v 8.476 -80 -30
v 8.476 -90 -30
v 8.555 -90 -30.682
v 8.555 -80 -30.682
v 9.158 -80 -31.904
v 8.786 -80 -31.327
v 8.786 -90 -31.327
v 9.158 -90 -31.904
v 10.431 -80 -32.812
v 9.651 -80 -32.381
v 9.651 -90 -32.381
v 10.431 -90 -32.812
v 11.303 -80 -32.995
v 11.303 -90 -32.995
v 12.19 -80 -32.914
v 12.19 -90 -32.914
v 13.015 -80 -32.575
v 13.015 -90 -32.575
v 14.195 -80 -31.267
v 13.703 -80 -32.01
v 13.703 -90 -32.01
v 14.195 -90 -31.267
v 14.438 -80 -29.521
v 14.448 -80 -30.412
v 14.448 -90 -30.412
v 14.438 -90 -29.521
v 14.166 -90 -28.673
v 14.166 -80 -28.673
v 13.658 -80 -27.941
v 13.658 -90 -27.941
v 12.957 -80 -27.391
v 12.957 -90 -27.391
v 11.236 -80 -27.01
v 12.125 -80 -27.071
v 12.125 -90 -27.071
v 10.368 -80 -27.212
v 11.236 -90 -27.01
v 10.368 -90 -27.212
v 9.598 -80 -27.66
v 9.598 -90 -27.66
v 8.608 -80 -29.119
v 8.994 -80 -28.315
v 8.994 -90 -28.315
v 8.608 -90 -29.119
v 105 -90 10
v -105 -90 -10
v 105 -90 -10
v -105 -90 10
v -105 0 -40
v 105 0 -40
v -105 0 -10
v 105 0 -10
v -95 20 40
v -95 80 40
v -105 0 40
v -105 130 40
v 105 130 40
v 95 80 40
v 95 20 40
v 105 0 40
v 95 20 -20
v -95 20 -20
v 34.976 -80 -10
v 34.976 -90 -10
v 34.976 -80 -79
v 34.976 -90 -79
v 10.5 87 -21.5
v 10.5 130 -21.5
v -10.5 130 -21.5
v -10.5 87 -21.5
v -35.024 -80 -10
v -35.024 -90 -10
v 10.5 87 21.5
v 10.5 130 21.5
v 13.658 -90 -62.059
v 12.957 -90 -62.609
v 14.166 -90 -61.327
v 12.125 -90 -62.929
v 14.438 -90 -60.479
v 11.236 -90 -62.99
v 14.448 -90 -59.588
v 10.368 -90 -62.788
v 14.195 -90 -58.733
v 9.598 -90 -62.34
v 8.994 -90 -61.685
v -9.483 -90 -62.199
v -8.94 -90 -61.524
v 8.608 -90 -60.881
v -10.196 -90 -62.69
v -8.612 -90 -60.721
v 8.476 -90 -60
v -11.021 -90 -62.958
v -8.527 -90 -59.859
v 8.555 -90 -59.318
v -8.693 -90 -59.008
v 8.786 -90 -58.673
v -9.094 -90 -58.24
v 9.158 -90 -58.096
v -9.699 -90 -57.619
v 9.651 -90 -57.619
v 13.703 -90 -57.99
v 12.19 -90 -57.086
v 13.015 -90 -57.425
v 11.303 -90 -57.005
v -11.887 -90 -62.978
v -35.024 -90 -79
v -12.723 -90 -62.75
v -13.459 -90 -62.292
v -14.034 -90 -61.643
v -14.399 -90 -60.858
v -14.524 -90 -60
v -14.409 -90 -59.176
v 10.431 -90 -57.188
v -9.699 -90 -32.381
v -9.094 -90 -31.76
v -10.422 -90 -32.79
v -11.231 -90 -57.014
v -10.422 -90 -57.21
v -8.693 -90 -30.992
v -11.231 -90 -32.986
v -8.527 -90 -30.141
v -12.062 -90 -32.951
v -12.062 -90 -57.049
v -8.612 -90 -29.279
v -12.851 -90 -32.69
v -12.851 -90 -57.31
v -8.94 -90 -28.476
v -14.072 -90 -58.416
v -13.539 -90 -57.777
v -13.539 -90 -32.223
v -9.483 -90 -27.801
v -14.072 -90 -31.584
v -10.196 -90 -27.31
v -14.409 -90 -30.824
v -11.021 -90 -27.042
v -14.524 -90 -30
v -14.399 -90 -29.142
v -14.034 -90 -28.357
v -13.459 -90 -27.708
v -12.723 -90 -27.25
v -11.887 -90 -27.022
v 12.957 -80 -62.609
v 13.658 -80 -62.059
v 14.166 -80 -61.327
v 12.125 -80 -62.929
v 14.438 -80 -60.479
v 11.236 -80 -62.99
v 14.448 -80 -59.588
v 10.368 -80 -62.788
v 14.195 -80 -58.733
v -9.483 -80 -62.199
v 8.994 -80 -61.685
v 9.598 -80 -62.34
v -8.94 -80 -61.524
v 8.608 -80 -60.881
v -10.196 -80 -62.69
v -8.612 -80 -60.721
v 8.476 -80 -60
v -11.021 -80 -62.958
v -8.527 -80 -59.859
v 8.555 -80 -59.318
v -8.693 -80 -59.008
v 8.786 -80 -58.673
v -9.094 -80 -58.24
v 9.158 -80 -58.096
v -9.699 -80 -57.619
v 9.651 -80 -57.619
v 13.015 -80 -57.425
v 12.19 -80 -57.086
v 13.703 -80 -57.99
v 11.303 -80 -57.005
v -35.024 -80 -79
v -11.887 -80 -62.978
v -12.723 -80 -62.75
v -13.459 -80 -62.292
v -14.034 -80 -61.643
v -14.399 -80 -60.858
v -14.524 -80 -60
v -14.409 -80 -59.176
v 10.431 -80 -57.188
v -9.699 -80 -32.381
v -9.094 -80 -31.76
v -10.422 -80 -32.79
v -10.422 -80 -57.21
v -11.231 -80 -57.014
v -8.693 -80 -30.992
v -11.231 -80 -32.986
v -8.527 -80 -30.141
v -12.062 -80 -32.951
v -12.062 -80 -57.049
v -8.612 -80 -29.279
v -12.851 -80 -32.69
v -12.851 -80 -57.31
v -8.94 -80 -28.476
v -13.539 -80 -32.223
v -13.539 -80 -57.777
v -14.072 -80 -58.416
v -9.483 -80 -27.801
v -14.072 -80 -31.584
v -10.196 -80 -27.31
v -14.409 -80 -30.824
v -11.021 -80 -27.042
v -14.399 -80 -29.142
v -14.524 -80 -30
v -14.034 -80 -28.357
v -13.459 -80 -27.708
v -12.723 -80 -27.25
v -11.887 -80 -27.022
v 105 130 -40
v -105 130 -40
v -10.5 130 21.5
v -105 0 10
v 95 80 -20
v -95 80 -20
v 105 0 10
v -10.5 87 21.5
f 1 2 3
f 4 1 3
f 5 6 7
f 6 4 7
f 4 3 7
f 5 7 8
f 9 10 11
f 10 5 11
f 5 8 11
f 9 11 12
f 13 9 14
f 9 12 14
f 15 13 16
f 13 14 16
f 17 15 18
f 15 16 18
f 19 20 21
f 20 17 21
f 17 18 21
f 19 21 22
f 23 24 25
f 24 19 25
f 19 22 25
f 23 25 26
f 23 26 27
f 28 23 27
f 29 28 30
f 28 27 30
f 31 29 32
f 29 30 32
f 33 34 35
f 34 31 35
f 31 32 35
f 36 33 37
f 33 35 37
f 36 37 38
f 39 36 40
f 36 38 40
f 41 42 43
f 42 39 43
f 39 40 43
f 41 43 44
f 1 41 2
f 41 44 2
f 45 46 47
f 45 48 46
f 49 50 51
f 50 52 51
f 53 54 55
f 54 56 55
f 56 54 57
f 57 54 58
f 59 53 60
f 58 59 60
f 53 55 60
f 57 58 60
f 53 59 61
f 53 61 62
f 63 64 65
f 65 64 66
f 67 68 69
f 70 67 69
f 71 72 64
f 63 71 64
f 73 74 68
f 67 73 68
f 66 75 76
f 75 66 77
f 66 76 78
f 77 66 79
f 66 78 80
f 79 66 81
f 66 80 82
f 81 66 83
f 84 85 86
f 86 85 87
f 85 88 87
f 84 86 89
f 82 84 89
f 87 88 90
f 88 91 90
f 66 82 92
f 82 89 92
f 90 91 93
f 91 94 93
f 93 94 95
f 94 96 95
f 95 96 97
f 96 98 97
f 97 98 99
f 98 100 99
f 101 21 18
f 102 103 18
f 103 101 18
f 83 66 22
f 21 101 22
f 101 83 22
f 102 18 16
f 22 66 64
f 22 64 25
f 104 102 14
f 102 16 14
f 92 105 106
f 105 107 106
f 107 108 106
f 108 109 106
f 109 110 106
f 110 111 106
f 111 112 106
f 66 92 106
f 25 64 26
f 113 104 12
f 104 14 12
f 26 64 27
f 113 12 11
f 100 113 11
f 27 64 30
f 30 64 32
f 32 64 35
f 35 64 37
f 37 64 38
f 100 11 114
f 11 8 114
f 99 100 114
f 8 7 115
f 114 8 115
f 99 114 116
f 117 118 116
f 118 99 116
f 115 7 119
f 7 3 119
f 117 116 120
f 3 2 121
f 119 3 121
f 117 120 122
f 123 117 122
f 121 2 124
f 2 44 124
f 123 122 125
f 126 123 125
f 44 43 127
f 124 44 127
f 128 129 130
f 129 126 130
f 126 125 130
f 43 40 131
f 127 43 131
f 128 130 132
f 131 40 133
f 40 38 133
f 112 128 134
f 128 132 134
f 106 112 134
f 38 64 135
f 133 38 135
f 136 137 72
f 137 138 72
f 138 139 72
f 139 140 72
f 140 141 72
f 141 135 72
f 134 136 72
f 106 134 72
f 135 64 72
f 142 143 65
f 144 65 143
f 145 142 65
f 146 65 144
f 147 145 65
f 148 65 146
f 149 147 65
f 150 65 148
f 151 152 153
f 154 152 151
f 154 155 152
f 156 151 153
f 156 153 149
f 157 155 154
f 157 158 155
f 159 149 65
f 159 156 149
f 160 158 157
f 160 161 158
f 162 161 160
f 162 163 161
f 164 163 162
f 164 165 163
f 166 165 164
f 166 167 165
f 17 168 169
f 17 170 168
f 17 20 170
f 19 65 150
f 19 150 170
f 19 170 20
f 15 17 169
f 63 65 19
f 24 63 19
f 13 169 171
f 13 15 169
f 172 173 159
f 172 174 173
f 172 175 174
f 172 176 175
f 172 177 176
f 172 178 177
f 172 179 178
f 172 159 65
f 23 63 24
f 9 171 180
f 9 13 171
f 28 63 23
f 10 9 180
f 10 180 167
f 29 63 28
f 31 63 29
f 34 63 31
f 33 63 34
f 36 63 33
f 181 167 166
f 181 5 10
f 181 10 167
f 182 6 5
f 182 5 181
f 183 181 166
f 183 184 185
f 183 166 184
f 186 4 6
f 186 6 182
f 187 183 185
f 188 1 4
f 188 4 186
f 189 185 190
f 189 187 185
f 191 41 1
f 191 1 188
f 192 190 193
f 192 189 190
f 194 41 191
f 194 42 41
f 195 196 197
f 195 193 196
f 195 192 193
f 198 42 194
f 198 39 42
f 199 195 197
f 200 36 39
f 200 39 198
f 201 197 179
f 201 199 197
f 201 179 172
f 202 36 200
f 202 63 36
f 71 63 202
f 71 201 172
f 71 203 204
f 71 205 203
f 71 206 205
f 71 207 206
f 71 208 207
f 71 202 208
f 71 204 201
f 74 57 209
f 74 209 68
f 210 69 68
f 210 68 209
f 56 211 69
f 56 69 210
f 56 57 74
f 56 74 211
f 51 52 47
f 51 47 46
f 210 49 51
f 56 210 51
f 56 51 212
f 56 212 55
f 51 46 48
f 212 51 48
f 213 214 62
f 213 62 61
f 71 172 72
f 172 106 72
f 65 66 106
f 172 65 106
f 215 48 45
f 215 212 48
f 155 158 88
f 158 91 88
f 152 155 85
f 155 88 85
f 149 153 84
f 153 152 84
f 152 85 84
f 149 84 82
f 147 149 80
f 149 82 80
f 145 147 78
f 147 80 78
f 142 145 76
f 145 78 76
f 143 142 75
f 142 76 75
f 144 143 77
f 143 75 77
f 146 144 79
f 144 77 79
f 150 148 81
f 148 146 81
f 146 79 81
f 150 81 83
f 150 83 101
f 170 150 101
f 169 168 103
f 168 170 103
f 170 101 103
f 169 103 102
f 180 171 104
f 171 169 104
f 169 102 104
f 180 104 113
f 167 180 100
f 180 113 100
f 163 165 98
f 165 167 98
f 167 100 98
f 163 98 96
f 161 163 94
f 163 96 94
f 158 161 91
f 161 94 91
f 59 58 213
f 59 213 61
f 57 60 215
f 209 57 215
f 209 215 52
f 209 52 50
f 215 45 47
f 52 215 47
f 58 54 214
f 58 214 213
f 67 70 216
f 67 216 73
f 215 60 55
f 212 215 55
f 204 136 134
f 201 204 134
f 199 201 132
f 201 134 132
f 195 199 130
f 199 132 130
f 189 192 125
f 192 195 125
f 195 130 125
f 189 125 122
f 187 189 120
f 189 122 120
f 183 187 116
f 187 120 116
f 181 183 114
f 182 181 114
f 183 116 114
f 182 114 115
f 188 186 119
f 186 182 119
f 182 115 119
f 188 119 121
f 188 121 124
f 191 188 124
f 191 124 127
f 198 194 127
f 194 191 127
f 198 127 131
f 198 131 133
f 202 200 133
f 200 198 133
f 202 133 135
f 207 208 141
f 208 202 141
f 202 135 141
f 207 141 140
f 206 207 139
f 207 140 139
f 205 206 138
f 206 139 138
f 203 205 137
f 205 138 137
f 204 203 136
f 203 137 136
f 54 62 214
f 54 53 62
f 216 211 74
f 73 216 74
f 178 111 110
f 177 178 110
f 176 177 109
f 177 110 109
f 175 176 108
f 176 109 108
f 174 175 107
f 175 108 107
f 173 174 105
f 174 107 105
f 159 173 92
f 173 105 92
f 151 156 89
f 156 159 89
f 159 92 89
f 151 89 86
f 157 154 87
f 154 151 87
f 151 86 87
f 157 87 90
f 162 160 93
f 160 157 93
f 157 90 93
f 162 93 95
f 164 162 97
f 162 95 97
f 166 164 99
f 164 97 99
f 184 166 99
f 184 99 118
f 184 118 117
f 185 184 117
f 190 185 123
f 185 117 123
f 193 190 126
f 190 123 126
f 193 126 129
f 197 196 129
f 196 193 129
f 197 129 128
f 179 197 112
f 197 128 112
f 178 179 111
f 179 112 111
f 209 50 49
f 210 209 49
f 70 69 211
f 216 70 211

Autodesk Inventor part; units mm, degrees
ref_plane "YZ Plane" through (0, 0, 0) normal (1, 0, 0) x (0, 1, 0)
ref_plane "XY Plane" through (0, 0, 0) normal (0, 0, 1) x (1, 0, 0)
sketch "Boceto1" plane through (0, 0, 0) normal (0, 1, 0) x (-1, 0, 0)
  line L0 (105, 40) -> (-105, 40)
  line L1 (-105, 40) -> (-105, -40)
  line L2 (-105, -40) -> (105, -40)
  line L3 (105, -40) -> (105, 40)
  line L4 (105, 40) -> (-105, -40) construction
  line L5 (-105, 40) -> (105, -40) construction
  point P0 (0, 0)
  dimension "d0" = 210
  dimension "d1" = 80
extrude "Extrusión1" add sketch "Boceto1" along normal blind 130
sketch "Boceto2" plane through (-105, 0, 40) normal (0, 0, 1) x (1, 0, 0)
  line L0 (10, 80) -> (200, 80)
  line L1 (200, 80) -> (200, 20)
  line L2 (200, 20) -> (10, 20)
  line L3 (10, 20) -> (10, 80)
  line L4 (10, 80) -> (200, 20) construction
  line L5 (200, 80) -> (10, 20) construction
  line L6 (0, 0) -> (210, 0) projected
  point P0 (105, 0)
  point P1 (105, 50)
  dimension "d4" = 190
  dimension "d5" = 60
  dimension "d6" = 20
extrude "Extrusión2" cut sketch "Boceto2" against normal blind 60
sketch "Boceto3" plane through (0, 130, 0) normal (0, 1, 0) x (1, 0, 0)
  line L0 (-10.5, -21.5) -> (10.5, -21.5)
  line L1 (10.5, -21.5) -> (10.5, 21.5)
  line L2 (10.5, 21.5) -> (-10.5, 21.5)
  line L3 (-10.5, 21.5) -> (-10.5, -21.5)
  line L4 (-10.5, -21.5) -> (10.5, 21.5) construction
  line L5 (10.5, -21.5) -> (-10.5, 21.5) construction
  point P0 (0, 0)
  point P1 (0, 0)
  dimension "d9" = 21
  dimension "d10" = 43
extrude "Extrusión3" cut sketch "Boceto3" against normal blind 43
sketch "Boceto4" plane through (0, 0, 0) normal (0, -1, 0) x (1, 0, 0)
  line L0 (105, 40) -> (105, -40) projected
  line L1 (-105, 10) -> (105, 10)
  line L2 (105, 10) -> (105, -10)
  line L3 (105, -10) -> (-105, -10)
  line L4 (-105, -10) -> (-105, 10)
  line L5 (-105, 10) -> (105, -10) construction
  line L6 (105, 10) -> (-105, -10) construction
  point P0 (0, 0)
  dimension "d13" = 20
extrude "Extrusión4" add sketch "Boceto4" along normal blind 90
ref_plane "Plano de trabajo1" through (0, -90, 0) normal (0, 1, 0) x (-1, 0, 0)
sketch "Boceto7" plane through (0, -90, 0) normal (0, 1, 0) x (-1, 0, 0)
  circle A0 centre (11.5239, -60) radius 3
  circle A1 centre (-11.4761, -60) radius 3
  line L0 (105, 10) -> (-105, 10)
  line L1 (105.0239, -10) -> (-104.9761, -10)
  line L2 (105.0239, -10) -> (-104.9761, -10)
  circle A2 centre (11.5239, -30) radius 3
  circle A3 centre (-11.4761, -30) radius 3
  line L3 (11.5239, -60) -> (-11.4761, -30)
  line L4 (11.5239, -30) -> (-11.4761, -60)
  line L5 (105, 10) -> (-105, 10)
  line L6 (-105, 10) -> (-95.8154, 10)
  line L7 (0.0239, -45) -> (-34.9761, -45)
  line L8 (0.0239, -45) -> (35.0239, -45)
  line L9 (35.0239, -45) -> (35.0239, -10)
  line L10 (-105, -10) -> (105, -10)
  line L11 (35.0239, -10) -> (-34.9761, -10)
  line L12 (-34.9761, -10) -> (-34.9761, -79)
  line L13 (-34.9761, -79) -> (35.0239, -79)
  line L14 (35.0239, -79) -> (35.0239, -10)
  line L15 (-105, -10) -> (105, -10) projected
  line L16 (-40.6213, -10) -> (-84.6707, -10)
  point P0 (0, 0)
  point P1 (0, 0)
  point P2 (0.0478, -10)
  dimension "d28" = 20
  dimension "d29" = 20
  dimension "d30" = 30
  dimension "d31" = 30
  dimension "d32" = 20
  dimension "d33" = 35
  dimension "d34" = 35
  dimension "d35" = 69
extrude "Extrusión6" add sketch "Boceto7" along normal blind 10 separate body
properties part number "front_support"
